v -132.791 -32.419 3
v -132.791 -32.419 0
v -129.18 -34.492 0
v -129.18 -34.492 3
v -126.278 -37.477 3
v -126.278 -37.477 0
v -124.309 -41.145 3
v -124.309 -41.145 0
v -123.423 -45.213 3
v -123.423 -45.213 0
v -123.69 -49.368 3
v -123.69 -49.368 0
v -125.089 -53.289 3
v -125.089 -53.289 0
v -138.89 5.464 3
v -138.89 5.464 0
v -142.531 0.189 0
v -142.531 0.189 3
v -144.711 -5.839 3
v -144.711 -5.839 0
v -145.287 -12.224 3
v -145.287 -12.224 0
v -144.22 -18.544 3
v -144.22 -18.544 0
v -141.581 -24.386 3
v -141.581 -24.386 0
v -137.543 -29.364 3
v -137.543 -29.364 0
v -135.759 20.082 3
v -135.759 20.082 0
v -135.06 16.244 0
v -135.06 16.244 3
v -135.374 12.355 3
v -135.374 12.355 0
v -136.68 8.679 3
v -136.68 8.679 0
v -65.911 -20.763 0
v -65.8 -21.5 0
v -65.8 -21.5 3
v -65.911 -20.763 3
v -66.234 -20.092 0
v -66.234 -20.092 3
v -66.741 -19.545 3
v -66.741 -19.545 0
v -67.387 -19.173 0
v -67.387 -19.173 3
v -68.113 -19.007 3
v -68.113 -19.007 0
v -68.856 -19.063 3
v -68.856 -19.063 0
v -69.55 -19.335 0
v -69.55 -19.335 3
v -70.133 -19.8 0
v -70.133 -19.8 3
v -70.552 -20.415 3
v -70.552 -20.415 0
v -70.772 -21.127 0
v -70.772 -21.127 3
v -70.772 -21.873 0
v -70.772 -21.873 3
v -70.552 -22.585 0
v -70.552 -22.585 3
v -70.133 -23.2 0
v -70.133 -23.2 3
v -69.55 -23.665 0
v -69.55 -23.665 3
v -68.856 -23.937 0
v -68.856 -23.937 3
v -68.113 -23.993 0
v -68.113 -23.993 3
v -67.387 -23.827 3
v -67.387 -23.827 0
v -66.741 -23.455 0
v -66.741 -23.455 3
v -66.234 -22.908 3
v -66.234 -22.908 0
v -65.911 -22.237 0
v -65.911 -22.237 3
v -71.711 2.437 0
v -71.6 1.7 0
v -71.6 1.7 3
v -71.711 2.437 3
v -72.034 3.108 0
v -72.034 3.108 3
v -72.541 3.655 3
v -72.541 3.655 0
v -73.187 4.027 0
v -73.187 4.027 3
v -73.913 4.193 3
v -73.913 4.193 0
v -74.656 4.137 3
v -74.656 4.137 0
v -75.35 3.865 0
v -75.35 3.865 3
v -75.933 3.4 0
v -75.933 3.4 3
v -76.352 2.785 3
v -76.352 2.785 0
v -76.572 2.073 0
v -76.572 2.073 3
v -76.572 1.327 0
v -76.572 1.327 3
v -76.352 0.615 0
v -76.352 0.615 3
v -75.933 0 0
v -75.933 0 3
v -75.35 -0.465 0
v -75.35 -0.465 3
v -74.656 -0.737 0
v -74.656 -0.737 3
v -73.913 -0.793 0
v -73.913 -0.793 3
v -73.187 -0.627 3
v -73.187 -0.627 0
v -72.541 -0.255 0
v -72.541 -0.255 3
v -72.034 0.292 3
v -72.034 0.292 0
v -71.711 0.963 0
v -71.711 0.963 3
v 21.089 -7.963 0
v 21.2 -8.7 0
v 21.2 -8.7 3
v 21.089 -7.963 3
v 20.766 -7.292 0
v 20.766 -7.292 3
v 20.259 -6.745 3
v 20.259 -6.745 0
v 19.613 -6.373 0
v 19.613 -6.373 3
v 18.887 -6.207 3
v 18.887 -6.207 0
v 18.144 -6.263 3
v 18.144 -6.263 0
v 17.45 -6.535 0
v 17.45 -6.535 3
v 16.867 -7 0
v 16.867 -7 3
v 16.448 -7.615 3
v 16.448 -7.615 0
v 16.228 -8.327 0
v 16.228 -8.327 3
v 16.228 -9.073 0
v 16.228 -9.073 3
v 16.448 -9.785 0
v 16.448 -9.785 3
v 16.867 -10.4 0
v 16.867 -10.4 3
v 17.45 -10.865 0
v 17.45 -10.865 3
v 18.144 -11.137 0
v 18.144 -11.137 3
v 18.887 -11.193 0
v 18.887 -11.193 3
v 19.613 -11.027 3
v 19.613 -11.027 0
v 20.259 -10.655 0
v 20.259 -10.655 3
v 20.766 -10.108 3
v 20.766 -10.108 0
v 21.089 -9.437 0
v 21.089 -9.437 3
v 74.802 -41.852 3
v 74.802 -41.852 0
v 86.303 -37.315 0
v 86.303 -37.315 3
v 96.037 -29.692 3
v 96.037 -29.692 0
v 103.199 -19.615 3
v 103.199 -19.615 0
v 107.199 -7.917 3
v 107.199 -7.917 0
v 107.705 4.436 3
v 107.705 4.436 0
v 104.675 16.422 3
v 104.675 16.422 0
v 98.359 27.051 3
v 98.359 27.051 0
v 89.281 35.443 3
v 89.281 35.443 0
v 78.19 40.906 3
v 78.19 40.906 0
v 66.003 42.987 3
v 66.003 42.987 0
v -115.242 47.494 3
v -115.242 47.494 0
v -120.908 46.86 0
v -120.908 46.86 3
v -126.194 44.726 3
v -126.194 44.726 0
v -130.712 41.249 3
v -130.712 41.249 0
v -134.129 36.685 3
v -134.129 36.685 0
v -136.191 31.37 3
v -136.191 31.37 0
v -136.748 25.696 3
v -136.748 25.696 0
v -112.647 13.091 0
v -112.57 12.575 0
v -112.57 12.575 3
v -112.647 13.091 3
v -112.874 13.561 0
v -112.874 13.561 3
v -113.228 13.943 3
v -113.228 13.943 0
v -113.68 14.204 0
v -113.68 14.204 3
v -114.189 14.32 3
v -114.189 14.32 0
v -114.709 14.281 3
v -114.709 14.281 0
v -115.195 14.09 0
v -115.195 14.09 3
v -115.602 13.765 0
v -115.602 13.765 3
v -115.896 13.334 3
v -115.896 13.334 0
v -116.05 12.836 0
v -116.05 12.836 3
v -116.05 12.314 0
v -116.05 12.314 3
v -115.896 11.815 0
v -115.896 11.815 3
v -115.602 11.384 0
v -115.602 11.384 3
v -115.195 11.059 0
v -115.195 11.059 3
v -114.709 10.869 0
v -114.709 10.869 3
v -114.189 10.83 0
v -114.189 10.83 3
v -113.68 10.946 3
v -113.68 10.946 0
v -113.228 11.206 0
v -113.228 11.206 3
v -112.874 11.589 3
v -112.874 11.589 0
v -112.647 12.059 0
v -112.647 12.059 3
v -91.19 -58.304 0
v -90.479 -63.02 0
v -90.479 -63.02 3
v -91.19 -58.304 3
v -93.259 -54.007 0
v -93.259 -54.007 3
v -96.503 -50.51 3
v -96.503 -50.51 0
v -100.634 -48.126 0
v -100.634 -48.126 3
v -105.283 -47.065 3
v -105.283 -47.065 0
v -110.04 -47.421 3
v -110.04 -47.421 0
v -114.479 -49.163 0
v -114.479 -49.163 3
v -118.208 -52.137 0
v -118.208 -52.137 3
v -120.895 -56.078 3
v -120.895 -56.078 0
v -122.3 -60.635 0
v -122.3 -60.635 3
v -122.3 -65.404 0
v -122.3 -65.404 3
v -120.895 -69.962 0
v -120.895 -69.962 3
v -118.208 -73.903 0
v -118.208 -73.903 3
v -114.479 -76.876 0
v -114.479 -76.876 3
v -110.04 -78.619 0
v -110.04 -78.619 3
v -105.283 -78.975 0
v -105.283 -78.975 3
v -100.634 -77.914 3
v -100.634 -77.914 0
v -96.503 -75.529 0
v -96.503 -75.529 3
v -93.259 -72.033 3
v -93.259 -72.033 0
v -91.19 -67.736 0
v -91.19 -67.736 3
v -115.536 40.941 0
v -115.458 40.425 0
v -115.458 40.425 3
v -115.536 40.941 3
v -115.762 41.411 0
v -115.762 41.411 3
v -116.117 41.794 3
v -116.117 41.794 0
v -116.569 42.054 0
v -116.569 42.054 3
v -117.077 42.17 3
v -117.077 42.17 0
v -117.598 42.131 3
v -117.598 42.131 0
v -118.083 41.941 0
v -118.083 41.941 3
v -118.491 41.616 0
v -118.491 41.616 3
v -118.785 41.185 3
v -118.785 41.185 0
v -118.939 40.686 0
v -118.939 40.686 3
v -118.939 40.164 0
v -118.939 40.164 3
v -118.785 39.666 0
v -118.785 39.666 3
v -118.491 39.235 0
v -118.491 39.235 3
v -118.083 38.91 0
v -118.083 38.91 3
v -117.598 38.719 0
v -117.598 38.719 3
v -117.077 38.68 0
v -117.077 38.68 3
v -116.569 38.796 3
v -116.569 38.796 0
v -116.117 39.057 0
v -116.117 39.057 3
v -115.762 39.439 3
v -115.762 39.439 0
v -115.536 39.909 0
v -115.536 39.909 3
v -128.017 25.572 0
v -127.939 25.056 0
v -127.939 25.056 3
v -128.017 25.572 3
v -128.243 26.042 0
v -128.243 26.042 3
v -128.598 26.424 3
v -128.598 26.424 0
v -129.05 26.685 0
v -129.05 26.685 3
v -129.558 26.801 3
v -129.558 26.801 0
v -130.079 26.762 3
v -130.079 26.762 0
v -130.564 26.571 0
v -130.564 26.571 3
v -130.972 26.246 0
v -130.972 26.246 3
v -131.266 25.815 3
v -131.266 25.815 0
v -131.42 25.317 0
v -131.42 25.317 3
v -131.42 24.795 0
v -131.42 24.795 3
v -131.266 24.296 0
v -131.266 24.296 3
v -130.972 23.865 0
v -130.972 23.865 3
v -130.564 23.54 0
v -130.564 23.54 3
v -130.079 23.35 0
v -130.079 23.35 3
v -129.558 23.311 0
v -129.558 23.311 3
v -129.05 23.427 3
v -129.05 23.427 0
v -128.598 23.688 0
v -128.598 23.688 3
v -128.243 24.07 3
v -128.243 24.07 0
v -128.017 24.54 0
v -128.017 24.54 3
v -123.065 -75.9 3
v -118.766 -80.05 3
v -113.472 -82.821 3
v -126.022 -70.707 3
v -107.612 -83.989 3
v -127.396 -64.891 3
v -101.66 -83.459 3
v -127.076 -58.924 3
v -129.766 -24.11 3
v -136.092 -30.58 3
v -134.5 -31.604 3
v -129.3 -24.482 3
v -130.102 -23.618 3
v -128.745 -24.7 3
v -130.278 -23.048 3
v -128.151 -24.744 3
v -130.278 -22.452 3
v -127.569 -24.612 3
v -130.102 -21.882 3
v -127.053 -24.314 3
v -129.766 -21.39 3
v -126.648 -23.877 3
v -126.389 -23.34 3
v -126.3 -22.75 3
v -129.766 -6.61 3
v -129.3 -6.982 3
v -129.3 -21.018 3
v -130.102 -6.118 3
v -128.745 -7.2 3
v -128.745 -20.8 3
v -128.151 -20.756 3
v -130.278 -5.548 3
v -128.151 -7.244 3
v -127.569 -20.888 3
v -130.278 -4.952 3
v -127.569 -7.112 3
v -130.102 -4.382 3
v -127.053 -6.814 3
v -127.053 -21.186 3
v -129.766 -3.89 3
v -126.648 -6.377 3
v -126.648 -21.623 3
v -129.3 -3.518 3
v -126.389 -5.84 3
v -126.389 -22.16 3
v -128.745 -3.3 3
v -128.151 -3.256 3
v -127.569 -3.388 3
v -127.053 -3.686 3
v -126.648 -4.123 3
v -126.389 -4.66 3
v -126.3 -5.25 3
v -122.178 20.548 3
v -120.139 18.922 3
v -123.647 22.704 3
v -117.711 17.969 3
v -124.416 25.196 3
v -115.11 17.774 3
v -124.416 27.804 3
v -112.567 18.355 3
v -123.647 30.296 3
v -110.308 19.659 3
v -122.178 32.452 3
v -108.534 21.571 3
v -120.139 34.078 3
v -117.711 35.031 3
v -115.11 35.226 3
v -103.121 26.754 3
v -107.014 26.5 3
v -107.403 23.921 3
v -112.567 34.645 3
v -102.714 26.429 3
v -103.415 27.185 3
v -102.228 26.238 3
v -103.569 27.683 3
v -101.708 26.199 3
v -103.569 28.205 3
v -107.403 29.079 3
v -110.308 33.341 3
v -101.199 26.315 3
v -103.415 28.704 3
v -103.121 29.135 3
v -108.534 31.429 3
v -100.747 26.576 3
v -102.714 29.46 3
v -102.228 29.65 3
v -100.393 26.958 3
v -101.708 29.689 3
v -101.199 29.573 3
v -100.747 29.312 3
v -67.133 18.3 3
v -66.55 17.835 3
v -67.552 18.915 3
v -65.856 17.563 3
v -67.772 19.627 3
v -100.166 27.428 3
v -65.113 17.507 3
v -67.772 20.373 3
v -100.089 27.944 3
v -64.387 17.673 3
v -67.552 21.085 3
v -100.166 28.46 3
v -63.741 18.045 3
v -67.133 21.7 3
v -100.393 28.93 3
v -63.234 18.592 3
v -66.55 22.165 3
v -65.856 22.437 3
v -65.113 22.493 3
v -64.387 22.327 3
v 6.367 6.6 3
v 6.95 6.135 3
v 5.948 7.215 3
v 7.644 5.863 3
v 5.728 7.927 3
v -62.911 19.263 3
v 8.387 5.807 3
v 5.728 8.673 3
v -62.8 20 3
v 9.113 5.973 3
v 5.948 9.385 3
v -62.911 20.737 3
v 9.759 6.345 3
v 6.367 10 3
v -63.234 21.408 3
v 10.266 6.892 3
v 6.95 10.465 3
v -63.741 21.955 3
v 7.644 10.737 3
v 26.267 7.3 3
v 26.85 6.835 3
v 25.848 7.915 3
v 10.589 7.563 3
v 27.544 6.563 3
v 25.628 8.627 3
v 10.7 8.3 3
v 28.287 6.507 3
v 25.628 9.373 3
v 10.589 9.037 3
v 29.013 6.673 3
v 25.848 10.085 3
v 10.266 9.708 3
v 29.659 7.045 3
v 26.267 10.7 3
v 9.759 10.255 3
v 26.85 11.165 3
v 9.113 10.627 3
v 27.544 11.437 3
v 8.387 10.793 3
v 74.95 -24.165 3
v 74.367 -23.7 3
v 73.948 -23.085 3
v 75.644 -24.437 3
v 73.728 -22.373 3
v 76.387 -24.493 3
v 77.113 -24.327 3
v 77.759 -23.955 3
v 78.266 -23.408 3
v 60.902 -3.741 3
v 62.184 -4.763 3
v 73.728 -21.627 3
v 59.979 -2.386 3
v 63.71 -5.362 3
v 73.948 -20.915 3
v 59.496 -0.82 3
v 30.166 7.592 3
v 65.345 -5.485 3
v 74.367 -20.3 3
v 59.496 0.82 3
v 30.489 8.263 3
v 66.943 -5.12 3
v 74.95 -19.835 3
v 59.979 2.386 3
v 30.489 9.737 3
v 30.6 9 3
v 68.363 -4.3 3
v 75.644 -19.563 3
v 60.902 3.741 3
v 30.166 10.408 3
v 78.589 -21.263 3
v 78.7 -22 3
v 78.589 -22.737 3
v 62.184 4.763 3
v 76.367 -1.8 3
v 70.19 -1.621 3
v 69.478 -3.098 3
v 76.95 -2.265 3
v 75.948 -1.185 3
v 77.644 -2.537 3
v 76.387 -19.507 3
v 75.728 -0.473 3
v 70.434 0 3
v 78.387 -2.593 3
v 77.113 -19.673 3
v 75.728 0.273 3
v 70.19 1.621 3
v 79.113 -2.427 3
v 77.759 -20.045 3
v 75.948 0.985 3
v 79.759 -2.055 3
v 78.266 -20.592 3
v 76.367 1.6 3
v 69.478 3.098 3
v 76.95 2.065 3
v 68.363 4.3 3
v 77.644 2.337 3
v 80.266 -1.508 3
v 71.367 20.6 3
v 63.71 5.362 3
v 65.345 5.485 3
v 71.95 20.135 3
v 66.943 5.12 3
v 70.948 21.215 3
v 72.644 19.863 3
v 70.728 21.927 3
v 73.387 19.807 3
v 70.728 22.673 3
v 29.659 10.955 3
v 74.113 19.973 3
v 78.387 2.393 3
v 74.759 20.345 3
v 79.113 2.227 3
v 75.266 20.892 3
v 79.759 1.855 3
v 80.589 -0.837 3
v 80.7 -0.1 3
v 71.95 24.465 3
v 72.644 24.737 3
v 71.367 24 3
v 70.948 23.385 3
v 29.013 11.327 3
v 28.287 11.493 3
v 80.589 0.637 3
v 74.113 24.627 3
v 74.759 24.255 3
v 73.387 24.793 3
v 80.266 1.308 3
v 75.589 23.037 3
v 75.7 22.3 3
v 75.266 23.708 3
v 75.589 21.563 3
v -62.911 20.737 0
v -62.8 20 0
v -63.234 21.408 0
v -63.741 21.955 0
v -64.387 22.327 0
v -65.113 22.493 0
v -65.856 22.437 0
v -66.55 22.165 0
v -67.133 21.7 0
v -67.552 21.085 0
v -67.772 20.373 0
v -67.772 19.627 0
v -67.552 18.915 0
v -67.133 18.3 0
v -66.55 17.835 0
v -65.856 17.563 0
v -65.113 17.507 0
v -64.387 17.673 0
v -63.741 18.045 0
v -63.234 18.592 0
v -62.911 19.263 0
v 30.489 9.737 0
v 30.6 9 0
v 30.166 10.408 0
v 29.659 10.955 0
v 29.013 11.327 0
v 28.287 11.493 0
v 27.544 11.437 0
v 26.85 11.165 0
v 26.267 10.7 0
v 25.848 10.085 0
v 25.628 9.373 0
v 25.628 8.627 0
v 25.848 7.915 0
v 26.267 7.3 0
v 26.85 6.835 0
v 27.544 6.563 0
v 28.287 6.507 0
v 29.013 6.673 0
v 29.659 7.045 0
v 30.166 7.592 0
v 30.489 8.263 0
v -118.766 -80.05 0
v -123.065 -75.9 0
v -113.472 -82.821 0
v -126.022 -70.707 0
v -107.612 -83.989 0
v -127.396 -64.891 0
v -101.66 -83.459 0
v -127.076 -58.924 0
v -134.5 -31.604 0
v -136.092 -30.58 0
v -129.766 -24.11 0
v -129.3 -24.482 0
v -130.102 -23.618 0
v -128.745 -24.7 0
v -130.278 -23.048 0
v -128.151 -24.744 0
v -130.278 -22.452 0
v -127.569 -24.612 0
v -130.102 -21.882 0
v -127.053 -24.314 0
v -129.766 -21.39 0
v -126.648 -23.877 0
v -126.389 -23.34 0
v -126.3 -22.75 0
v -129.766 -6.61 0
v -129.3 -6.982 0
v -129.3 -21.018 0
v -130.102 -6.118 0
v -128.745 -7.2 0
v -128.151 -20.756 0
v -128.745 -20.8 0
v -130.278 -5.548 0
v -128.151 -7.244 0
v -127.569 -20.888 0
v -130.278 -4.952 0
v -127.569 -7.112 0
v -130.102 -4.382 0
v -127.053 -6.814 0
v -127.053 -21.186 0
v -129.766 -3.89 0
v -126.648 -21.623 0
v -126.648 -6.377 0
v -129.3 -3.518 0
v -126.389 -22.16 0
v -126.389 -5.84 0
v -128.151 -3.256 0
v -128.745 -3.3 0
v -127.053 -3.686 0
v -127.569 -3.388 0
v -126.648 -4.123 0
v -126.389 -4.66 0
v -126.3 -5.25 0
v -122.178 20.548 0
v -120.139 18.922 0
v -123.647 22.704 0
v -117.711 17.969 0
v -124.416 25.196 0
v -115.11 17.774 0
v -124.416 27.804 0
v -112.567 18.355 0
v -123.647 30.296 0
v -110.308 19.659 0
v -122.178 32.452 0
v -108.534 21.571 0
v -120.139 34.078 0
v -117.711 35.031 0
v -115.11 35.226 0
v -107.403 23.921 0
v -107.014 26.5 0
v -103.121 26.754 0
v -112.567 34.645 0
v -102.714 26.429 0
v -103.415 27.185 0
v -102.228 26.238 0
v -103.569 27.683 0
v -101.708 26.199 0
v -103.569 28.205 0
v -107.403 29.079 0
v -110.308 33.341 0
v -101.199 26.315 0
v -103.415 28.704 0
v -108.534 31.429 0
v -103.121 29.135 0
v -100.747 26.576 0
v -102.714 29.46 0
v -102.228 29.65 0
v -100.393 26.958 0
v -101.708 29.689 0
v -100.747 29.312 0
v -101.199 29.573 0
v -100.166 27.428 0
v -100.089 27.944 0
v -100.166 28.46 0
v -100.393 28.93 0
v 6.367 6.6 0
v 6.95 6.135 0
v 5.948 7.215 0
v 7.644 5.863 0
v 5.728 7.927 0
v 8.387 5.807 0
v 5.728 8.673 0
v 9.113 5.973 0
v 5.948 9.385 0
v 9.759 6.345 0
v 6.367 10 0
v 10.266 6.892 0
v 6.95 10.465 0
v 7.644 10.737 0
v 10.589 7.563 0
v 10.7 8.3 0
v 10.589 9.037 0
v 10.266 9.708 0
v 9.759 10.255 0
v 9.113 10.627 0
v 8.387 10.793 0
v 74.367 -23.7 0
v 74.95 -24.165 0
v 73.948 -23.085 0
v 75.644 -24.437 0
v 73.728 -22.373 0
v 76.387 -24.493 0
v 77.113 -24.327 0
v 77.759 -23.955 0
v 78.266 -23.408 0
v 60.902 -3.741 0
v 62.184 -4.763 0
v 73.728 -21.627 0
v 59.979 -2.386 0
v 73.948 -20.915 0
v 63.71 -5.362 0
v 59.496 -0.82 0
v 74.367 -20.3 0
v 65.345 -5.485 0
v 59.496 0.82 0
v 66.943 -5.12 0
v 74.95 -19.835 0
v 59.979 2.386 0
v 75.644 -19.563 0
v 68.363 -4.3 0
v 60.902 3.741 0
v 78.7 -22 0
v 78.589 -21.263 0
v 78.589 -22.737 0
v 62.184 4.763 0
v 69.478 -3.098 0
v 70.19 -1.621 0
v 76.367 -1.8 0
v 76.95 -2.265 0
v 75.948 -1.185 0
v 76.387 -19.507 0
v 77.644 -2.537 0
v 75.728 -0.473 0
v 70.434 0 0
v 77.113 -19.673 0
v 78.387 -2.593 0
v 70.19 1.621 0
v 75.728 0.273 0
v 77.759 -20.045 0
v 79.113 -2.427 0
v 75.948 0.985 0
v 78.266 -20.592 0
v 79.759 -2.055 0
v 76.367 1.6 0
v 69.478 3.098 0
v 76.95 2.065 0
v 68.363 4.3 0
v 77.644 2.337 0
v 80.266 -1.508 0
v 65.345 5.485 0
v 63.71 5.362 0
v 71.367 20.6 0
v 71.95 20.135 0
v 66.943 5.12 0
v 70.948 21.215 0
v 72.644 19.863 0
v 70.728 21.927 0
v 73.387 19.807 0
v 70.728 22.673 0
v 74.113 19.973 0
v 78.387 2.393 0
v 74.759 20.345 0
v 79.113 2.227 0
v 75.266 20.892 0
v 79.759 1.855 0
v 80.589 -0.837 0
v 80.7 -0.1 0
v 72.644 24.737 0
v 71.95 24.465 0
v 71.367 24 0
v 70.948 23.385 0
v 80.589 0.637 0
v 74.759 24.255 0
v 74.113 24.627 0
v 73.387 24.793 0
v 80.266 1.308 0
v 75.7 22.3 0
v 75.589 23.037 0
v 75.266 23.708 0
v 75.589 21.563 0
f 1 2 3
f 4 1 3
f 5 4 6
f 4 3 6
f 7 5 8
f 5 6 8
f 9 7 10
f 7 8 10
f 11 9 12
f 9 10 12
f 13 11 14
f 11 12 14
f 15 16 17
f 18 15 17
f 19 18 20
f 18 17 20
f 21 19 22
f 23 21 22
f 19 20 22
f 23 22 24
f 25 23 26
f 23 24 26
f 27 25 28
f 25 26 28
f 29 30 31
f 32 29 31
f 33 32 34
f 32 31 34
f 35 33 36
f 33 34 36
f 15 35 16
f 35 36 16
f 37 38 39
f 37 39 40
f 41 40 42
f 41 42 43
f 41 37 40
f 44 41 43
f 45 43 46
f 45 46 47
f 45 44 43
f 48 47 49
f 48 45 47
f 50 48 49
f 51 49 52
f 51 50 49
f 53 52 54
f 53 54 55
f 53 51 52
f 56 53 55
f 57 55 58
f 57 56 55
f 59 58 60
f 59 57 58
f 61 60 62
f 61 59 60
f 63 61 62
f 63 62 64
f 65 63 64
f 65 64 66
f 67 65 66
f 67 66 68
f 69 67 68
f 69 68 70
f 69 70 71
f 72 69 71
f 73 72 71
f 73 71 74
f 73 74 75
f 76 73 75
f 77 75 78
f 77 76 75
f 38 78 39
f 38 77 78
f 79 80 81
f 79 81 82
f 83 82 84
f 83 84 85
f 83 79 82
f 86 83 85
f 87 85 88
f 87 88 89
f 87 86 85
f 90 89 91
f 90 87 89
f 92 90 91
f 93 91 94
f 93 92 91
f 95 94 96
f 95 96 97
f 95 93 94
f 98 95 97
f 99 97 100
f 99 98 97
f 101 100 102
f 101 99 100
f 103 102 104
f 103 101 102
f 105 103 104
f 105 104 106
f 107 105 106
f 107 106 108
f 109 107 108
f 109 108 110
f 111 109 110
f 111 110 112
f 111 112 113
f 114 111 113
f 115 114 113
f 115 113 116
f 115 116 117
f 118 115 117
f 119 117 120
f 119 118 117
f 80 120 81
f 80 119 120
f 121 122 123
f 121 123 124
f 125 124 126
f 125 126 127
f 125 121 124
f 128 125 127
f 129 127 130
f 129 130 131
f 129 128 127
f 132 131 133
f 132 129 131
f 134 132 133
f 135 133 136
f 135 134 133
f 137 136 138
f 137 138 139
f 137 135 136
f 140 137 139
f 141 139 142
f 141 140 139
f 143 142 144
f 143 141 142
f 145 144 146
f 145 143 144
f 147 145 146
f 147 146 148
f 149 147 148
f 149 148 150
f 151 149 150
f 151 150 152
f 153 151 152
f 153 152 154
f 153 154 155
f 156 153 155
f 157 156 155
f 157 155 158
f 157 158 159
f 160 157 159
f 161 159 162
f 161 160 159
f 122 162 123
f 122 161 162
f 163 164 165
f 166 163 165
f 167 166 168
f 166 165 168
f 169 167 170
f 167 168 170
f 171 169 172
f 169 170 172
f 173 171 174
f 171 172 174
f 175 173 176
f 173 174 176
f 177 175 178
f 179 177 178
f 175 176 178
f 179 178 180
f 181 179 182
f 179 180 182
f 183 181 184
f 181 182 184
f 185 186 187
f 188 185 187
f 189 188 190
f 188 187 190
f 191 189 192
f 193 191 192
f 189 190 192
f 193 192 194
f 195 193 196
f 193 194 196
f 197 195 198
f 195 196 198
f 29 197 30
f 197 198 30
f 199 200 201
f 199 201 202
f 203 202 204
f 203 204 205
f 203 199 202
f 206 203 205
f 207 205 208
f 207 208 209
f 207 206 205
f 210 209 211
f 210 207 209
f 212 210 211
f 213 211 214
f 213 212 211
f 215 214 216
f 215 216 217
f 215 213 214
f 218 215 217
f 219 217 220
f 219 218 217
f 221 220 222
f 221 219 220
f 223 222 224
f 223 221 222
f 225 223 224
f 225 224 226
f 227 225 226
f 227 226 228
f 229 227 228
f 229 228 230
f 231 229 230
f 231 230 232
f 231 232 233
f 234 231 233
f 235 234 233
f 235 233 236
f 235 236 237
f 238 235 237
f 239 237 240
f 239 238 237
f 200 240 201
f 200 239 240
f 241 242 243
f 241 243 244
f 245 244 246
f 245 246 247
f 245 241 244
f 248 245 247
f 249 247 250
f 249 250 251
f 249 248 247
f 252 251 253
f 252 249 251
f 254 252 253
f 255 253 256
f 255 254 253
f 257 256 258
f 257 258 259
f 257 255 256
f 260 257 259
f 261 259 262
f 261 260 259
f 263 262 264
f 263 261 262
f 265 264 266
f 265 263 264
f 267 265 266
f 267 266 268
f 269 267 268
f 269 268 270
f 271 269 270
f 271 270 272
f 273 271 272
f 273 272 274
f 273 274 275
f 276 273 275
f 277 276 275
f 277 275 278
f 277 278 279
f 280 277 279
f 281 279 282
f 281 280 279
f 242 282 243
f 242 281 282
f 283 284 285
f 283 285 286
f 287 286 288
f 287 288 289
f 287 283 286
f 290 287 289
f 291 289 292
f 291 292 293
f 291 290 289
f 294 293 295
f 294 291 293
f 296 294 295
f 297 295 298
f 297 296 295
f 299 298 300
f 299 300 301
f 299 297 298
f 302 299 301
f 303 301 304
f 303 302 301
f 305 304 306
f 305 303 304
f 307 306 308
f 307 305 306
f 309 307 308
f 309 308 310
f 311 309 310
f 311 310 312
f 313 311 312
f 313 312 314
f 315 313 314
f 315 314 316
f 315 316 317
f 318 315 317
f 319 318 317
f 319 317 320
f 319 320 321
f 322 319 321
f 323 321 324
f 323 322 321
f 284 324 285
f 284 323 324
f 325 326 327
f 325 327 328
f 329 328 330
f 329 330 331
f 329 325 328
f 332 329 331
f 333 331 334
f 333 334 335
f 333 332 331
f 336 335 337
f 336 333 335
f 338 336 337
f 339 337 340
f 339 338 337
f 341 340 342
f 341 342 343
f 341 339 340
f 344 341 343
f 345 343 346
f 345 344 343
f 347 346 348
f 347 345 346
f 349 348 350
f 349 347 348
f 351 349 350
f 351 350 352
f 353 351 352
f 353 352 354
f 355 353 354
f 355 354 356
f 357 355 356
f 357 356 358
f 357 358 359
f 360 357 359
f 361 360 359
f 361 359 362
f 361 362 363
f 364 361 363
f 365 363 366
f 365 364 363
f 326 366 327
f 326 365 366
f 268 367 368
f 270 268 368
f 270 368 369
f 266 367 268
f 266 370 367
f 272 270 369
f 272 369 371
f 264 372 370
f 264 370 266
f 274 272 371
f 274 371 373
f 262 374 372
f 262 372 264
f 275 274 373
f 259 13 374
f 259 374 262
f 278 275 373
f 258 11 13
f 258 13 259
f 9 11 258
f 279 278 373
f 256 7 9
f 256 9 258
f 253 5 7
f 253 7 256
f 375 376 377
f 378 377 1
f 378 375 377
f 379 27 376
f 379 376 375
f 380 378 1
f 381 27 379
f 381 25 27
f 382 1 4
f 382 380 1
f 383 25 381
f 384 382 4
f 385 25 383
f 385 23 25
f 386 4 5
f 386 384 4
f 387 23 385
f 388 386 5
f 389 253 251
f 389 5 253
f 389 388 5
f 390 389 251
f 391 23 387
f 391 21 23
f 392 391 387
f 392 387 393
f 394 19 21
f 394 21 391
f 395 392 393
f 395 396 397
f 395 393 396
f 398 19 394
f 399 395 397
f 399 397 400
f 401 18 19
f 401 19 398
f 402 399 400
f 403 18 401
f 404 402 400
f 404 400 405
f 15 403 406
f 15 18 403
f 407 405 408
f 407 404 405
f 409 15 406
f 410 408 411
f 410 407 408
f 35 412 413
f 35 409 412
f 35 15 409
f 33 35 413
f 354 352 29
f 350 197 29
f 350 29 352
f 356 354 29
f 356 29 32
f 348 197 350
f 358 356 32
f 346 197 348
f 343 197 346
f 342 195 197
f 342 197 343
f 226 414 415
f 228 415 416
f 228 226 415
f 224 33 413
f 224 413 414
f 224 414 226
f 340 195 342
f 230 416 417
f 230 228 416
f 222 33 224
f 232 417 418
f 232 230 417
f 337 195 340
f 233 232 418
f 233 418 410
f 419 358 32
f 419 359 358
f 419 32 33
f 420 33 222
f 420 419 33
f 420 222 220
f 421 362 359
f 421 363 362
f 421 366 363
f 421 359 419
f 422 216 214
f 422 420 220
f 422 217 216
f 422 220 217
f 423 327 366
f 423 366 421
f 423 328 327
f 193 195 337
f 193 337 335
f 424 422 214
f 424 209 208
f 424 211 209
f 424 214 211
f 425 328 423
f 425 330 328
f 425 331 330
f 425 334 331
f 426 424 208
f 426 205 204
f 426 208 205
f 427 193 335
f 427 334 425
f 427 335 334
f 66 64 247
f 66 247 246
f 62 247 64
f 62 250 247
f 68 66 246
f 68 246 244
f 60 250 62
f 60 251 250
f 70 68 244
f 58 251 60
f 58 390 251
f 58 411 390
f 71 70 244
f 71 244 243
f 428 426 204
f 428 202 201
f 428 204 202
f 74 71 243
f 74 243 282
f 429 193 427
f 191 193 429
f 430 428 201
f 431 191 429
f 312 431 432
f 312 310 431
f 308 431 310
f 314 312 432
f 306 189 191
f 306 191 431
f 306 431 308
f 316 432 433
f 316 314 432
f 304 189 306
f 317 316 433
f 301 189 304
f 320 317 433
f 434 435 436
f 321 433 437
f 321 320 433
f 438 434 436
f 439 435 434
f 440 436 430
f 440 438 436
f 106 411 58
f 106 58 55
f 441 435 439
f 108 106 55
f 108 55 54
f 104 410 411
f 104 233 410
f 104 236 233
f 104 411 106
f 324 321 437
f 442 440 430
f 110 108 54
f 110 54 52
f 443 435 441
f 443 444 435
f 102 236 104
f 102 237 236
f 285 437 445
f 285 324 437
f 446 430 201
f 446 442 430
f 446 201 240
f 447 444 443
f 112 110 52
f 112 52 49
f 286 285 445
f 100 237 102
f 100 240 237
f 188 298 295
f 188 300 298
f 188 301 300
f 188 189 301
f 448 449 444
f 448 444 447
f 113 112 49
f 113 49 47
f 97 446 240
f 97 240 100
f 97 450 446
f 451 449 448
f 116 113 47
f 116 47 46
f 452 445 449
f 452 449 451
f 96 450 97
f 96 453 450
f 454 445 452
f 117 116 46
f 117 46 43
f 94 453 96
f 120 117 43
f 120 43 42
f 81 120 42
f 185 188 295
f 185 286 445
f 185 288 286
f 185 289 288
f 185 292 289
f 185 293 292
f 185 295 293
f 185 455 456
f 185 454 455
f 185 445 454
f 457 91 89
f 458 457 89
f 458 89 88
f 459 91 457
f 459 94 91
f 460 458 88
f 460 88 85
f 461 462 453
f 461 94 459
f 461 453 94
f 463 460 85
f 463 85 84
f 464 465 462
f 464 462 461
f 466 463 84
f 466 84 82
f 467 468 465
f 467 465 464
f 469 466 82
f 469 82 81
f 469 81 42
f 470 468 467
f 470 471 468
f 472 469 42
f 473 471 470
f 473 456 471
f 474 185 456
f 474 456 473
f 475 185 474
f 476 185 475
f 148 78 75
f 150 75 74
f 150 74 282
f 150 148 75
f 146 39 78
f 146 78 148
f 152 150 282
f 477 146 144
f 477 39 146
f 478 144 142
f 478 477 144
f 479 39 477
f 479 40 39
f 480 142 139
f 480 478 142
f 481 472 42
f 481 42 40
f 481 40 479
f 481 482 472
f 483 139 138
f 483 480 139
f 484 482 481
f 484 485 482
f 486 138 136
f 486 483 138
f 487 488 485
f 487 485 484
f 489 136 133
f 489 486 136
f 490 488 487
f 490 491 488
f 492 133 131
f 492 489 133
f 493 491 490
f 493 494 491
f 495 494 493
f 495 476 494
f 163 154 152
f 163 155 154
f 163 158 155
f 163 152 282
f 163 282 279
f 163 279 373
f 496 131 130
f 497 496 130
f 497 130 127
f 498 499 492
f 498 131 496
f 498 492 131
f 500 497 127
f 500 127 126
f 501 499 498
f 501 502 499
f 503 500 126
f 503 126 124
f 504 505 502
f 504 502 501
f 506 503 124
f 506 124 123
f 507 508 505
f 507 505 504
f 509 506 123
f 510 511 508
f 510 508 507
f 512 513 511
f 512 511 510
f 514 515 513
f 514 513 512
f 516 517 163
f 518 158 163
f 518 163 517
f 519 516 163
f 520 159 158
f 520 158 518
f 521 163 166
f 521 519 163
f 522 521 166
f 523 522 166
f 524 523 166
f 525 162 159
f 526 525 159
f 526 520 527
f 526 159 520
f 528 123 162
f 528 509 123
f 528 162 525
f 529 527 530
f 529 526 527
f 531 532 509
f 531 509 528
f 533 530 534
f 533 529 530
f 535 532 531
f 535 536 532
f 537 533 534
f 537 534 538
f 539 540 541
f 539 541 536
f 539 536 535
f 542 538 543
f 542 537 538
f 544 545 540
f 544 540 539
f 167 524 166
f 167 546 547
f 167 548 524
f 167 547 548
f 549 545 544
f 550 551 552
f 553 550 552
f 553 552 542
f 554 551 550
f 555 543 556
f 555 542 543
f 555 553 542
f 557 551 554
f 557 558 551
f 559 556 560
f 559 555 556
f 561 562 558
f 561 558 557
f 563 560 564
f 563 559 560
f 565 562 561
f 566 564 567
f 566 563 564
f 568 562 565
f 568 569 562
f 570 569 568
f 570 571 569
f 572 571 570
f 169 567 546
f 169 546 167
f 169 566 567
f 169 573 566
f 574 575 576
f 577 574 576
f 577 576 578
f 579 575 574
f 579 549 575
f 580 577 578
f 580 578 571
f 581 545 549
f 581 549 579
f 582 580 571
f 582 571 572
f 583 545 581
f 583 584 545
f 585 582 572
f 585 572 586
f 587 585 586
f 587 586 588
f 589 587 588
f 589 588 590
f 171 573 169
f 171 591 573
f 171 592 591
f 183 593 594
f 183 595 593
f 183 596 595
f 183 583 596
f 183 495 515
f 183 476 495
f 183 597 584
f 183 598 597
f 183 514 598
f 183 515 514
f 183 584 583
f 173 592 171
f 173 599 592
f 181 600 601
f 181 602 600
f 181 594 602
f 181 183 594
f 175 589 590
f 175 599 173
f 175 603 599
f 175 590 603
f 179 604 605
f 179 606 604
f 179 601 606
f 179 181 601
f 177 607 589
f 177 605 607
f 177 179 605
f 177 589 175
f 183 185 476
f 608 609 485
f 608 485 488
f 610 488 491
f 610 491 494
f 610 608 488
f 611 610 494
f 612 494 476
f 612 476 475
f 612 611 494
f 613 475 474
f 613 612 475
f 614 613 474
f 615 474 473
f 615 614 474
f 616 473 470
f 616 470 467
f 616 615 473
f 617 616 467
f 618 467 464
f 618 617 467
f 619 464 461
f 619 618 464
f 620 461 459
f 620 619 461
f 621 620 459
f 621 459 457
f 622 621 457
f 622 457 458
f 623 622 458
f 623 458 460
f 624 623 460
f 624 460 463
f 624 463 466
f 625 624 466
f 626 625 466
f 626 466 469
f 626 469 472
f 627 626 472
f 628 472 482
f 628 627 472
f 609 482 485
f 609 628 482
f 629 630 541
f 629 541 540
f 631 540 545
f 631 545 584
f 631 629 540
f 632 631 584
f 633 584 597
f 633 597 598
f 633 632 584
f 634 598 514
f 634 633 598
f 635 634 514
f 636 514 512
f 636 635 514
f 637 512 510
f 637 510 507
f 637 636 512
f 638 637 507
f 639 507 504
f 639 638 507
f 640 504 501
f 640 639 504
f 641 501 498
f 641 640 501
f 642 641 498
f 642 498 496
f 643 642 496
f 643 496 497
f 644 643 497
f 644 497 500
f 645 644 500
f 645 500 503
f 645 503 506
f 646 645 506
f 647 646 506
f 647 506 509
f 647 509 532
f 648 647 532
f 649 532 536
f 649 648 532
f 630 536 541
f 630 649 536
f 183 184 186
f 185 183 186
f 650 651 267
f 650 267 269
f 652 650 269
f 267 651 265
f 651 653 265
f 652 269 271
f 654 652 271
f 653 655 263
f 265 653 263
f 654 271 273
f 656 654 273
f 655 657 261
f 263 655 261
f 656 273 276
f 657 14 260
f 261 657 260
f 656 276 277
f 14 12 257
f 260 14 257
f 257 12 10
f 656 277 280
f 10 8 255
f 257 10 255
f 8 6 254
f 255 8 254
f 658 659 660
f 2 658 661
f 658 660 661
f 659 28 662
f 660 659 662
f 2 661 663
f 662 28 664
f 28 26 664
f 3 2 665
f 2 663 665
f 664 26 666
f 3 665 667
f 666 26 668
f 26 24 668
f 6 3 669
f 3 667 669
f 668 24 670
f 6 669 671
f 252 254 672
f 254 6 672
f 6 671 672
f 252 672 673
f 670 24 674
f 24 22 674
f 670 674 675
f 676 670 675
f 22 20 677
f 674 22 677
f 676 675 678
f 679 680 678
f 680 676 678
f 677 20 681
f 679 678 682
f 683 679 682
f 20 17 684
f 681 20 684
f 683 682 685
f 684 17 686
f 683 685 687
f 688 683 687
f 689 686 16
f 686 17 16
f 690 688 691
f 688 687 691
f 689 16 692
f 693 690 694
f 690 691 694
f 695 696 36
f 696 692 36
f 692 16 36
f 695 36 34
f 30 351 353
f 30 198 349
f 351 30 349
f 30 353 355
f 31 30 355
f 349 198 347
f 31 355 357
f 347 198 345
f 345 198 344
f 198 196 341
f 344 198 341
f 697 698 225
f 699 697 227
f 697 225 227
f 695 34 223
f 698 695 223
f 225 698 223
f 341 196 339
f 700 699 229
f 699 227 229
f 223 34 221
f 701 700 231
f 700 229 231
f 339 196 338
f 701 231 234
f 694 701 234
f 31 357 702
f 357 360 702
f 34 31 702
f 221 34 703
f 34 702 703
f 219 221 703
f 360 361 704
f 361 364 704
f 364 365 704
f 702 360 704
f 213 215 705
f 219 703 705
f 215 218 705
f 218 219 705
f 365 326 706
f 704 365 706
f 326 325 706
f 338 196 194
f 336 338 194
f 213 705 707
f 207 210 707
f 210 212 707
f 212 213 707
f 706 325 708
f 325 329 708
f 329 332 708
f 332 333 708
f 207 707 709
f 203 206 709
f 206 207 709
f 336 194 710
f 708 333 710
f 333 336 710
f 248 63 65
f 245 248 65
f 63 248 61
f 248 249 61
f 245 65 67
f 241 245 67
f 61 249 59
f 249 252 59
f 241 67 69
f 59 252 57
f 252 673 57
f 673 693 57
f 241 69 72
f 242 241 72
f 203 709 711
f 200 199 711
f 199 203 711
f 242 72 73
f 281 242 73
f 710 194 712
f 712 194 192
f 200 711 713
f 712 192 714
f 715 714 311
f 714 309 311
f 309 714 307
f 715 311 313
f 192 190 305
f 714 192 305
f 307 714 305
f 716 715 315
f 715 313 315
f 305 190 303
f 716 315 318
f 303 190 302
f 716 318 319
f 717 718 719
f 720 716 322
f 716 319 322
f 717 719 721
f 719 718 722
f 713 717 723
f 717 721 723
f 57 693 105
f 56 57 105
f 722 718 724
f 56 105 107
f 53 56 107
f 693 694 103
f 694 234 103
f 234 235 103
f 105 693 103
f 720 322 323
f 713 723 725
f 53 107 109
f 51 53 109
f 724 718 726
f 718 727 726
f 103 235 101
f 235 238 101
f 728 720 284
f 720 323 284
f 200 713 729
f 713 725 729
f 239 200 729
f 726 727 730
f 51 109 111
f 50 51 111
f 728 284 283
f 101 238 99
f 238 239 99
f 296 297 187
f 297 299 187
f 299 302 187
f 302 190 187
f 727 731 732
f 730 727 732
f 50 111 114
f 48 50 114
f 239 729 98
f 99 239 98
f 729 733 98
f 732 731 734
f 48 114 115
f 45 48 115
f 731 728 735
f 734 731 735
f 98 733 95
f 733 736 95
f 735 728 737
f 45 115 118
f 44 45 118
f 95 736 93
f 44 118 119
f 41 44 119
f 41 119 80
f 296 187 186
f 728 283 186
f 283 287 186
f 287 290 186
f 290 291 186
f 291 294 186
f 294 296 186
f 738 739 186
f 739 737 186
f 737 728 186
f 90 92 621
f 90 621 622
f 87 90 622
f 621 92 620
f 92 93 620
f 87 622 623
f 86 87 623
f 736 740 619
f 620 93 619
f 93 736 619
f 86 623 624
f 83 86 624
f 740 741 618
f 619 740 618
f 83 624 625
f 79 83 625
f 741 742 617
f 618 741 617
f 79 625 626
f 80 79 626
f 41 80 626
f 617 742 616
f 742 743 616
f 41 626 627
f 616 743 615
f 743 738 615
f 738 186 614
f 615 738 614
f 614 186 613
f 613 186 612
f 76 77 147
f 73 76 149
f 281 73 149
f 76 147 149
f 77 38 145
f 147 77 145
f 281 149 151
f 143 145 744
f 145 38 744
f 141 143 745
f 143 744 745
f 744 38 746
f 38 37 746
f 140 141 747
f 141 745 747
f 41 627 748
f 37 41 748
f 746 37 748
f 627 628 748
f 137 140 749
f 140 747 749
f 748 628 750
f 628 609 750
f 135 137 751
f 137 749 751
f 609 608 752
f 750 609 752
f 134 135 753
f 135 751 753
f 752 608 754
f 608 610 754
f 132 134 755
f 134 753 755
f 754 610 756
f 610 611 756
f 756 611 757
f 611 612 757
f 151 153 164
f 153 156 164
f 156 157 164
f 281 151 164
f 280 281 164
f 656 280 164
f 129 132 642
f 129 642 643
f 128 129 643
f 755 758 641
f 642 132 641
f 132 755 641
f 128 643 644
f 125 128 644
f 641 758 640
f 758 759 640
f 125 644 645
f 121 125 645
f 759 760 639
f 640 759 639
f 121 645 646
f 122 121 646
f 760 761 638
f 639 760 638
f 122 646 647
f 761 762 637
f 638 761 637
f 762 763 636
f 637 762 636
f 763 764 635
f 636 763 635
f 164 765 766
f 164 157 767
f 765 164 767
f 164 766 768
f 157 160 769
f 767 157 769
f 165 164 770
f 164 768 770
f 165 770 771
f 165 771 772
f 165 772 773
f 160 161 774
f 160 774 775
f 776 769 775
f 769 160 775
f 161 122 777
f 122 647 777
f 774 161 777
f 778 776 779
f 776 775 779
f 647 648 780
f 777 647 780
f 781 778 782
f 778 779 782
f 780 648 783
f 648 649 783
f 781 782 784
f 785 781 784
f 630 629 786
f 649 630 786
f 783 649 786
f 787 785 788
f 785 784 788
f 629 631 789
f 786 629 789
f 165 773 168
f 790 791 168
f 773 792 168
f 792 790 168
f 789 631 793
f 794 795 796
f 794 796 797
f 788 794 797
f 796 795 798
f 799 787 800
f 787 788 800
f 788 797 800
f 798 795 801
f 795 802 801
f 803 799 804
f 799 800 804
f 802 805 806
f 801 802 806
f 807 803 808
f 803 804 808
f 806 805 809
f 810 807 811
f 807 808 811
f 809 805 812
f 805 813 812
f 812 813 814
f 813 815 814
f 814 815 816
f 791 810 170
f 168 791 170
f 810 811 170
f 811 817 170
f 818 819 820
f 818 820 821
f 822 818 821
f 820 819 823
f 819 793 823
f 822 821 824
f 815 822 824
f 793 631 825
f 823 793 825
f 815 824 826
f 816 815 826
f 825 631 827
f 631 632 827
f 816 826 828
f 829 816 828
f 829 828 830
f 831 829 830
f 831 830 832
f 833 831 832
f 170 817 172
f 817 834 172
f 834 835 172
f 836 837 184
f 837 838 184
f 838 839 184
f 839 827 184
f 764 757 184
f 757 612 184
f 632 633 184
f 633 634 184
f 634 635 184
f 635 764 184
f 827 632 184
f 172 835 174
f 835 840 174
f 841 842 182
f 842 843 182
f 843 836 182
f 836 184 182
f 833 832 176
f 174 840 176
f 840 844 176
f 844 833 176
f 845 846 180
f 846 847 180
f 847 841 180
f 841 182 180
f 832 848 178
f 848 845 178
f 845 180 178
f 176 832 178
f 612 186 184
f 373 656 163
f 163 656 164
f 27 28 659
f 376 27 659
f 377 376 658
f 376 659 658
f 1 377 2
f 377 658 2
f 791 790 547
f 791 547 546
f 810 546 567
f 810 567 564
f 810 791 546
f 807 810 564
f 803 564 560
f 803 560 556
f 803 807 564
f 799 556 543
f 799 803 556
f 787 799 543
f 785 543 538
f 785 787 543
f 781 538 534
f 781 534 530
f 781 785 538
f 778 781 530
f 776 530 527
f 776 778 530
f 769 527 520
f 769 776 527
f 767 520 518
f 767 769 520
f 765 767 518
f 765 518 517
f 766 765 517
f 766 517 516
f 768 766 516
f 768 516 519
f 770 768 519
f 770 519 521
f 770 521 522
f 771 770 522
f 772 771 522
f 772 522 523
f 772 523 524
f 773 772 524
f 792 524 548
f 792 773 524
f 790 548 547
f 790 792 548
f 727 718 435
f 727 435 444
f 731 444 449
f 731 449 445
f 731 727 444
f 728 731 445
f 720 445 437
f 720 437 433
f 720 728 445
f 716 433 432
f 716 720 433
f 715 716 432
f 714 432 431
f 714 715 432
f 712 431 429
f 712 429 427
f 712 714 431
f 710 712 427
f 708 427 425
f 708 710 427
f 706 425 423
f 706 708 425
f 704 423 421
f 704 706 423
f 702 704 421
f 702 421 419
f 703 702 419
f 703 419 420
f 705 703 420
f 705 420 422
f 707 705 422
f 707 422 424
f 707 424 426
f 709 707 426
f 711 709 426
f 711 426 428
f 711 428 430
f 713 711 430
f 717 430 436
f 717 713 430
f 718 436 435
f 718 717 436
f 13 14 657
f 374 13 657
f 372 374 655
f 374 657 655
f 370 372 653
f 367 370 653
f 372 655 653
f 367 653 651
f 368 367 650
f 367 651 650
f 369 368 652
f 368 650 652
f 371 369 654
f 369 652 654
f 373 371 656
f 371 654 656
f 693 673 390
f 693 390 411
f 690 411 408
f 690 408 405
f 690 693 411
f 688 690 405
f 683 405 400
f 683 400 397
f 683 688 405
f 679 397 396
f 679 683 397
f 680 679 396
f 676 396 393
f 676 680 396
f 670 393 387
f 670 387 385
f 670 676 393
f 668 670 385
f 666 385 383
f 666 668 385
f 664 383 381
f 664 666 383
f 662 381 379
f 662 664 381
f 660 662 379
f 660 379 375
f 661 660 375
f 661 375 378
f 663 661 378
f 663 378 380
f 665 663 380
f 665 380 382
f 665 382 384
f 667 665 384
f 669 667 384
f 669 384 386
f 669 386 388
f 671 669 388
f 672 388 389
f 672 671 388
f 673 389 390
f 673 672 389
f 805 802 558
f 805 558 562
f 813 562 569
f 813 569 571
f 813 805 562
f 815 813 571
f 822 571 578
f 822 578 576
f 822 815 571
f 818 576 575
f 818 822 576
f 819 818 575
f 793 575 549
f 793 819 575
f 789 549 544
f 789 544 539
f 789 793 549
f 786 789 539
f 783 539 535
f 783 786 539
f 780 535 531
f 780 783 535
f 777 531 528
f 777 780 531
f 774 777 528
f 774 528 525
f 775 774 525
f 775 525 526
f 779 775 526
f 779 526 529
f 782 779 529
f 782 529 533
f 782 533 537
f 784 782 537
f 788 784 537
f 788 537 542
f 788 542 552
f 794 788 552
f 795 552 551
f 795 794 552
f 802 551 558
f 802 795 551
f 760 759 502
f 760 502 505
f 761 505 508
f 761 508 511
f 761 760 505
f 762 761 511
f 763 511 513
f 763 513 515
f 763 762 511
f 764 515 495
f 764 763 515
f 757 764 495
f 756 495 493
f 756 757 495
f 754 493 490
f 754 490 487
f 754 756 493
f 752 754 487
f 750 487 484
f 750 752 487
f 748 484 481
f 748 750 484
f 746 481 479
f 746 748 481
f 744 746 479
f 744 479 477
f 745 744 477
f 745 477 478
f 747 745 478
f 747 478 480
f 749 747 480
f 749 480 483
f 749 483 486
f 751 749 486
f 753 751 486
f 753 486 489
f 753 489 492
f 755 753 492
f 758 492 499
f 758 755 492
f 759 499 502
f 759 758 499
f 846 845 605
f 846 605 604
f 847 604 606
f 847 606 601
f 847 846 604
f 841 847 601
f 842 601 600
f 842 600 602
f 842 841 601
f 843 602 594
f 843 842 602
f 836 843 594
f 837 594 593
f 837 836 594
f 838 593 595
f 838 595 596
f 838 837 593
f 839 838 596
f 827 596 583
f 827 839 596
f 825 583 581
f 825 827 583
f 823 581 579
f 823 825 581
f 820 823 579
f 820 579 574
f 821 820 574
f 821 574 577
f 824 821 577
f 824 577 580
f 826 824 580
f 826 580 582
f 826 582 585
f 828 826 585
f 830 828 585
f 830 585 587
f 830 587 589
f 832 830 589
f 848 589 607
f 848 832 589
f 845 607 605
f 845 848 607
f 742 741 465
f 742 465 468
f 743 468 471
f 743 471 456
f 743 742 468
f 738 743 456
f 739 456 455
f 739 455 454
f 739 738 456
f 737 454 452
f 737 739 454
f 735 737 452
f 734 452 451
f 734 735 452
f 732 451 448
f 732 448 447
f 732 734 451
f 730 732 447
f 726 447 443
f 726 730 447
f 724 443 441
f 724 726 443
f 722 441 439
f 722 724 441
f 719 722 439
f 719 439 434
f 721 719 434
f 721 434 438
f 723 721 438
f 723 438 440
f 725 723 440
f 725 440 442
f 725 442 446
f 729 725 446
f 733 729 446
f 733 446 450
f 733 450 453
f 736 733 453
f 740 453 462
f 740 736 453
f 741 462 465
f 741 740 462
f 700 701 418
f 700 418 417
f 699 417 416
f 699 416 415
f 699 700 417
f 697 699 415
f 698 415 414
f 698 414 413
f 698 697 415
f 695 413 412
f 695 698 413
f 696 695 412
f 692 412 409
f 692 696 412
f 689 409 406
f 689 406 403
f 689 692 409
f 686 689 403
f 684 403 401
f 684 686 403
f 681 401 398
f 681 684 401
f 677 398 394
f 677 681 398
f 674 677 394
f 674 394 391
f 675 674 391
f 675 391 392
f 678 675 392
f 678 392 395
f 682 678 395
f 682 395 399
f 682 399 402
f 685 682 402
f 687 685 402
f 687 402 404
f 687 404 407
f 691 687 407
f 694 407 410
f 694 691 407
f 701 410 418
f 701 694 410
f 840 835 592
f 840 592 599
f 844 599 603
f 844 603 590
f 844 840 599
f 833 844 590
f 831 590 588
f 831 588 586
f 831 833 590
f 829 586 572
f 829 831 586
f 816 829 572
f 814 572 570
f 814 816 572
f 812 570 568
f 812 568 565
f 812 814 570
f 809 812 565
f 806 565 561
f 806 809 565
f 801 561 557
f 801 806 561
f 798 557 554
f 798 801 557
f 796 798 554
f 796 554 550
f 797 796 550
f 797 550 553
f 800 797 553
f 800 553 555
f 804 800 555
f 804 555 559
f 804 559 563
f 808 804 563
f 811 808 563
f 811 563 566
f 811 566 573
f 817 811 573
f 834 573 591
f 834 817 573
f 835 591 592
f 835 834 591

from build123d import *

# Parameters (mm, degrees)
SKETCH1_R           = 2
SKETCH1_R_2         = 2.5
SKETCH1_R_3         = 5.5
SKETCH1_R_4         = 1.75
SKETCH1_R_5         = 8.75
SKETCH1_R_6         = 16
BOSS_EXTRUDE1_DEPTH = 3


with BuildPart() as part:
    # Sketch1 → Boss-Extrude1 (new body)
    with BuildSketch(Plane.XY):
        with BuildLine():
            Line((-101.659864494, -83.45932429), (74.802197756, -41.852361745))
            ThreePointArc((74.802197756, -41.852361745), (107.704647438, 4.436019045), (66.002975735, 42.986712534))
            Line((66.002975735, 42.986712534), (-115.241855356, 47.493510774))
            ThreePointArc((-115.241855356, 47.493510774), (-132.576190146, 39.08356421), (-135.758964721, 20.081556162))
            ThreePointArc((-135.758964721, 20.081556162), (-135.373925263, 12.354995282), (-138.890242706, 5.464167316))
            ThreePointArc((-138.890242706, 5.464167316), (-145.2866753, -12.223575588), (-137.542861296, -29.364285714))
            ThreePointArc((-137.542861296, -29.364285714), (-135.311942722, -31.117537591), (-132.790777729, -32.419312113))
            ThreePointArc((-132.790777729, -32.419312113), (-124.308939641, -41.145198886), (-125.08868845, -53.289113787))
            ThreePointArc((-125.08868845, -53.289113787), (-123.065402539, -75.899910202), (-101.659864494, -83.45932429))
        make_face()
        with Locations((-128.3, -22.75)):
            Circle(SKETCH1_R, mode=Mode.SUBTRACT)
        with Locations((-68.3, -21.5)):
            Circle(SKETCH1_R_2, mode=Mode.SUBTRACT)
        with Locations((-128.3, -5.25)):
            Circle(SKETCH1_R, mode=Mode.SUBTRACT)
        with Locations((-74.1, 1.7)):
            Circle(SKETCH1_R_2, mode=Mode.SUBTRACT)
        with Locations((18.7, -8.7)):
            Circle(SKETCH1_R_2, mode=Mode.SUBTRACT)
        with Locations((76.2, -22)):
            Circle(SKETCH1_R_2, mode=Mode.SUBTRACT)
        with Locations((8.2, 8.3)):
            Circle(SKETCH1_R_2, mode=Mode.SUBTRACT)
        with Locations((64.934076539, 0)):
            Circle(SKETCH1_R_3, mode=Mode.SUBTRACT)
        with Locations((78.2, -0.1)):
            Circle(SKETCH1_R_2, mode=Mode.SUBTRACT)
        with Locations((-114.319590013, 12.574697906)):
            Circle(SKETCH1_R_4, mode=Mode.SUBTRACT)
        with Locations((-129.68917795, 25.055714157)):
            Circle(SKETCH1_R_4, mode=Mode.SUBTRACT)
        with Locations((-65.3, 20)):
            Circle(SKETCH1_R_2, mode=Mode.SUBTRACT)
        with Locations((-115.763875856, 26.5)):
            Circle(SKETCH1_R_5, mode=Mode.SUBTRACT)
        with Locations((-101.838573763, 27.944285843)):
            Circle(SKETCH1_R_4, mode=Mode.SUBTRACT)
        with Locations((-117.208161699, 40.425302094)):
            Circle(SKETCH1_R_4, mode=Mode.SUBTRACT)
        with Locations((28.1, 9)):
            Circle(SKETCH1_R_2, mode=Mode.SUBTRACT)
        with Locations((73.2, 22.3)):
            Circle(SKETCH1_R_2, mode=Mode.SUBTRACT)
        with Locations((-106.479181151, -63.019799174)):
            Circle(SKETCH1_R_6, mode=Mode.SUBTRACT)
    extrude(amount=BOSS_EXTRUDE1_DEPTH)


solid = part.part
